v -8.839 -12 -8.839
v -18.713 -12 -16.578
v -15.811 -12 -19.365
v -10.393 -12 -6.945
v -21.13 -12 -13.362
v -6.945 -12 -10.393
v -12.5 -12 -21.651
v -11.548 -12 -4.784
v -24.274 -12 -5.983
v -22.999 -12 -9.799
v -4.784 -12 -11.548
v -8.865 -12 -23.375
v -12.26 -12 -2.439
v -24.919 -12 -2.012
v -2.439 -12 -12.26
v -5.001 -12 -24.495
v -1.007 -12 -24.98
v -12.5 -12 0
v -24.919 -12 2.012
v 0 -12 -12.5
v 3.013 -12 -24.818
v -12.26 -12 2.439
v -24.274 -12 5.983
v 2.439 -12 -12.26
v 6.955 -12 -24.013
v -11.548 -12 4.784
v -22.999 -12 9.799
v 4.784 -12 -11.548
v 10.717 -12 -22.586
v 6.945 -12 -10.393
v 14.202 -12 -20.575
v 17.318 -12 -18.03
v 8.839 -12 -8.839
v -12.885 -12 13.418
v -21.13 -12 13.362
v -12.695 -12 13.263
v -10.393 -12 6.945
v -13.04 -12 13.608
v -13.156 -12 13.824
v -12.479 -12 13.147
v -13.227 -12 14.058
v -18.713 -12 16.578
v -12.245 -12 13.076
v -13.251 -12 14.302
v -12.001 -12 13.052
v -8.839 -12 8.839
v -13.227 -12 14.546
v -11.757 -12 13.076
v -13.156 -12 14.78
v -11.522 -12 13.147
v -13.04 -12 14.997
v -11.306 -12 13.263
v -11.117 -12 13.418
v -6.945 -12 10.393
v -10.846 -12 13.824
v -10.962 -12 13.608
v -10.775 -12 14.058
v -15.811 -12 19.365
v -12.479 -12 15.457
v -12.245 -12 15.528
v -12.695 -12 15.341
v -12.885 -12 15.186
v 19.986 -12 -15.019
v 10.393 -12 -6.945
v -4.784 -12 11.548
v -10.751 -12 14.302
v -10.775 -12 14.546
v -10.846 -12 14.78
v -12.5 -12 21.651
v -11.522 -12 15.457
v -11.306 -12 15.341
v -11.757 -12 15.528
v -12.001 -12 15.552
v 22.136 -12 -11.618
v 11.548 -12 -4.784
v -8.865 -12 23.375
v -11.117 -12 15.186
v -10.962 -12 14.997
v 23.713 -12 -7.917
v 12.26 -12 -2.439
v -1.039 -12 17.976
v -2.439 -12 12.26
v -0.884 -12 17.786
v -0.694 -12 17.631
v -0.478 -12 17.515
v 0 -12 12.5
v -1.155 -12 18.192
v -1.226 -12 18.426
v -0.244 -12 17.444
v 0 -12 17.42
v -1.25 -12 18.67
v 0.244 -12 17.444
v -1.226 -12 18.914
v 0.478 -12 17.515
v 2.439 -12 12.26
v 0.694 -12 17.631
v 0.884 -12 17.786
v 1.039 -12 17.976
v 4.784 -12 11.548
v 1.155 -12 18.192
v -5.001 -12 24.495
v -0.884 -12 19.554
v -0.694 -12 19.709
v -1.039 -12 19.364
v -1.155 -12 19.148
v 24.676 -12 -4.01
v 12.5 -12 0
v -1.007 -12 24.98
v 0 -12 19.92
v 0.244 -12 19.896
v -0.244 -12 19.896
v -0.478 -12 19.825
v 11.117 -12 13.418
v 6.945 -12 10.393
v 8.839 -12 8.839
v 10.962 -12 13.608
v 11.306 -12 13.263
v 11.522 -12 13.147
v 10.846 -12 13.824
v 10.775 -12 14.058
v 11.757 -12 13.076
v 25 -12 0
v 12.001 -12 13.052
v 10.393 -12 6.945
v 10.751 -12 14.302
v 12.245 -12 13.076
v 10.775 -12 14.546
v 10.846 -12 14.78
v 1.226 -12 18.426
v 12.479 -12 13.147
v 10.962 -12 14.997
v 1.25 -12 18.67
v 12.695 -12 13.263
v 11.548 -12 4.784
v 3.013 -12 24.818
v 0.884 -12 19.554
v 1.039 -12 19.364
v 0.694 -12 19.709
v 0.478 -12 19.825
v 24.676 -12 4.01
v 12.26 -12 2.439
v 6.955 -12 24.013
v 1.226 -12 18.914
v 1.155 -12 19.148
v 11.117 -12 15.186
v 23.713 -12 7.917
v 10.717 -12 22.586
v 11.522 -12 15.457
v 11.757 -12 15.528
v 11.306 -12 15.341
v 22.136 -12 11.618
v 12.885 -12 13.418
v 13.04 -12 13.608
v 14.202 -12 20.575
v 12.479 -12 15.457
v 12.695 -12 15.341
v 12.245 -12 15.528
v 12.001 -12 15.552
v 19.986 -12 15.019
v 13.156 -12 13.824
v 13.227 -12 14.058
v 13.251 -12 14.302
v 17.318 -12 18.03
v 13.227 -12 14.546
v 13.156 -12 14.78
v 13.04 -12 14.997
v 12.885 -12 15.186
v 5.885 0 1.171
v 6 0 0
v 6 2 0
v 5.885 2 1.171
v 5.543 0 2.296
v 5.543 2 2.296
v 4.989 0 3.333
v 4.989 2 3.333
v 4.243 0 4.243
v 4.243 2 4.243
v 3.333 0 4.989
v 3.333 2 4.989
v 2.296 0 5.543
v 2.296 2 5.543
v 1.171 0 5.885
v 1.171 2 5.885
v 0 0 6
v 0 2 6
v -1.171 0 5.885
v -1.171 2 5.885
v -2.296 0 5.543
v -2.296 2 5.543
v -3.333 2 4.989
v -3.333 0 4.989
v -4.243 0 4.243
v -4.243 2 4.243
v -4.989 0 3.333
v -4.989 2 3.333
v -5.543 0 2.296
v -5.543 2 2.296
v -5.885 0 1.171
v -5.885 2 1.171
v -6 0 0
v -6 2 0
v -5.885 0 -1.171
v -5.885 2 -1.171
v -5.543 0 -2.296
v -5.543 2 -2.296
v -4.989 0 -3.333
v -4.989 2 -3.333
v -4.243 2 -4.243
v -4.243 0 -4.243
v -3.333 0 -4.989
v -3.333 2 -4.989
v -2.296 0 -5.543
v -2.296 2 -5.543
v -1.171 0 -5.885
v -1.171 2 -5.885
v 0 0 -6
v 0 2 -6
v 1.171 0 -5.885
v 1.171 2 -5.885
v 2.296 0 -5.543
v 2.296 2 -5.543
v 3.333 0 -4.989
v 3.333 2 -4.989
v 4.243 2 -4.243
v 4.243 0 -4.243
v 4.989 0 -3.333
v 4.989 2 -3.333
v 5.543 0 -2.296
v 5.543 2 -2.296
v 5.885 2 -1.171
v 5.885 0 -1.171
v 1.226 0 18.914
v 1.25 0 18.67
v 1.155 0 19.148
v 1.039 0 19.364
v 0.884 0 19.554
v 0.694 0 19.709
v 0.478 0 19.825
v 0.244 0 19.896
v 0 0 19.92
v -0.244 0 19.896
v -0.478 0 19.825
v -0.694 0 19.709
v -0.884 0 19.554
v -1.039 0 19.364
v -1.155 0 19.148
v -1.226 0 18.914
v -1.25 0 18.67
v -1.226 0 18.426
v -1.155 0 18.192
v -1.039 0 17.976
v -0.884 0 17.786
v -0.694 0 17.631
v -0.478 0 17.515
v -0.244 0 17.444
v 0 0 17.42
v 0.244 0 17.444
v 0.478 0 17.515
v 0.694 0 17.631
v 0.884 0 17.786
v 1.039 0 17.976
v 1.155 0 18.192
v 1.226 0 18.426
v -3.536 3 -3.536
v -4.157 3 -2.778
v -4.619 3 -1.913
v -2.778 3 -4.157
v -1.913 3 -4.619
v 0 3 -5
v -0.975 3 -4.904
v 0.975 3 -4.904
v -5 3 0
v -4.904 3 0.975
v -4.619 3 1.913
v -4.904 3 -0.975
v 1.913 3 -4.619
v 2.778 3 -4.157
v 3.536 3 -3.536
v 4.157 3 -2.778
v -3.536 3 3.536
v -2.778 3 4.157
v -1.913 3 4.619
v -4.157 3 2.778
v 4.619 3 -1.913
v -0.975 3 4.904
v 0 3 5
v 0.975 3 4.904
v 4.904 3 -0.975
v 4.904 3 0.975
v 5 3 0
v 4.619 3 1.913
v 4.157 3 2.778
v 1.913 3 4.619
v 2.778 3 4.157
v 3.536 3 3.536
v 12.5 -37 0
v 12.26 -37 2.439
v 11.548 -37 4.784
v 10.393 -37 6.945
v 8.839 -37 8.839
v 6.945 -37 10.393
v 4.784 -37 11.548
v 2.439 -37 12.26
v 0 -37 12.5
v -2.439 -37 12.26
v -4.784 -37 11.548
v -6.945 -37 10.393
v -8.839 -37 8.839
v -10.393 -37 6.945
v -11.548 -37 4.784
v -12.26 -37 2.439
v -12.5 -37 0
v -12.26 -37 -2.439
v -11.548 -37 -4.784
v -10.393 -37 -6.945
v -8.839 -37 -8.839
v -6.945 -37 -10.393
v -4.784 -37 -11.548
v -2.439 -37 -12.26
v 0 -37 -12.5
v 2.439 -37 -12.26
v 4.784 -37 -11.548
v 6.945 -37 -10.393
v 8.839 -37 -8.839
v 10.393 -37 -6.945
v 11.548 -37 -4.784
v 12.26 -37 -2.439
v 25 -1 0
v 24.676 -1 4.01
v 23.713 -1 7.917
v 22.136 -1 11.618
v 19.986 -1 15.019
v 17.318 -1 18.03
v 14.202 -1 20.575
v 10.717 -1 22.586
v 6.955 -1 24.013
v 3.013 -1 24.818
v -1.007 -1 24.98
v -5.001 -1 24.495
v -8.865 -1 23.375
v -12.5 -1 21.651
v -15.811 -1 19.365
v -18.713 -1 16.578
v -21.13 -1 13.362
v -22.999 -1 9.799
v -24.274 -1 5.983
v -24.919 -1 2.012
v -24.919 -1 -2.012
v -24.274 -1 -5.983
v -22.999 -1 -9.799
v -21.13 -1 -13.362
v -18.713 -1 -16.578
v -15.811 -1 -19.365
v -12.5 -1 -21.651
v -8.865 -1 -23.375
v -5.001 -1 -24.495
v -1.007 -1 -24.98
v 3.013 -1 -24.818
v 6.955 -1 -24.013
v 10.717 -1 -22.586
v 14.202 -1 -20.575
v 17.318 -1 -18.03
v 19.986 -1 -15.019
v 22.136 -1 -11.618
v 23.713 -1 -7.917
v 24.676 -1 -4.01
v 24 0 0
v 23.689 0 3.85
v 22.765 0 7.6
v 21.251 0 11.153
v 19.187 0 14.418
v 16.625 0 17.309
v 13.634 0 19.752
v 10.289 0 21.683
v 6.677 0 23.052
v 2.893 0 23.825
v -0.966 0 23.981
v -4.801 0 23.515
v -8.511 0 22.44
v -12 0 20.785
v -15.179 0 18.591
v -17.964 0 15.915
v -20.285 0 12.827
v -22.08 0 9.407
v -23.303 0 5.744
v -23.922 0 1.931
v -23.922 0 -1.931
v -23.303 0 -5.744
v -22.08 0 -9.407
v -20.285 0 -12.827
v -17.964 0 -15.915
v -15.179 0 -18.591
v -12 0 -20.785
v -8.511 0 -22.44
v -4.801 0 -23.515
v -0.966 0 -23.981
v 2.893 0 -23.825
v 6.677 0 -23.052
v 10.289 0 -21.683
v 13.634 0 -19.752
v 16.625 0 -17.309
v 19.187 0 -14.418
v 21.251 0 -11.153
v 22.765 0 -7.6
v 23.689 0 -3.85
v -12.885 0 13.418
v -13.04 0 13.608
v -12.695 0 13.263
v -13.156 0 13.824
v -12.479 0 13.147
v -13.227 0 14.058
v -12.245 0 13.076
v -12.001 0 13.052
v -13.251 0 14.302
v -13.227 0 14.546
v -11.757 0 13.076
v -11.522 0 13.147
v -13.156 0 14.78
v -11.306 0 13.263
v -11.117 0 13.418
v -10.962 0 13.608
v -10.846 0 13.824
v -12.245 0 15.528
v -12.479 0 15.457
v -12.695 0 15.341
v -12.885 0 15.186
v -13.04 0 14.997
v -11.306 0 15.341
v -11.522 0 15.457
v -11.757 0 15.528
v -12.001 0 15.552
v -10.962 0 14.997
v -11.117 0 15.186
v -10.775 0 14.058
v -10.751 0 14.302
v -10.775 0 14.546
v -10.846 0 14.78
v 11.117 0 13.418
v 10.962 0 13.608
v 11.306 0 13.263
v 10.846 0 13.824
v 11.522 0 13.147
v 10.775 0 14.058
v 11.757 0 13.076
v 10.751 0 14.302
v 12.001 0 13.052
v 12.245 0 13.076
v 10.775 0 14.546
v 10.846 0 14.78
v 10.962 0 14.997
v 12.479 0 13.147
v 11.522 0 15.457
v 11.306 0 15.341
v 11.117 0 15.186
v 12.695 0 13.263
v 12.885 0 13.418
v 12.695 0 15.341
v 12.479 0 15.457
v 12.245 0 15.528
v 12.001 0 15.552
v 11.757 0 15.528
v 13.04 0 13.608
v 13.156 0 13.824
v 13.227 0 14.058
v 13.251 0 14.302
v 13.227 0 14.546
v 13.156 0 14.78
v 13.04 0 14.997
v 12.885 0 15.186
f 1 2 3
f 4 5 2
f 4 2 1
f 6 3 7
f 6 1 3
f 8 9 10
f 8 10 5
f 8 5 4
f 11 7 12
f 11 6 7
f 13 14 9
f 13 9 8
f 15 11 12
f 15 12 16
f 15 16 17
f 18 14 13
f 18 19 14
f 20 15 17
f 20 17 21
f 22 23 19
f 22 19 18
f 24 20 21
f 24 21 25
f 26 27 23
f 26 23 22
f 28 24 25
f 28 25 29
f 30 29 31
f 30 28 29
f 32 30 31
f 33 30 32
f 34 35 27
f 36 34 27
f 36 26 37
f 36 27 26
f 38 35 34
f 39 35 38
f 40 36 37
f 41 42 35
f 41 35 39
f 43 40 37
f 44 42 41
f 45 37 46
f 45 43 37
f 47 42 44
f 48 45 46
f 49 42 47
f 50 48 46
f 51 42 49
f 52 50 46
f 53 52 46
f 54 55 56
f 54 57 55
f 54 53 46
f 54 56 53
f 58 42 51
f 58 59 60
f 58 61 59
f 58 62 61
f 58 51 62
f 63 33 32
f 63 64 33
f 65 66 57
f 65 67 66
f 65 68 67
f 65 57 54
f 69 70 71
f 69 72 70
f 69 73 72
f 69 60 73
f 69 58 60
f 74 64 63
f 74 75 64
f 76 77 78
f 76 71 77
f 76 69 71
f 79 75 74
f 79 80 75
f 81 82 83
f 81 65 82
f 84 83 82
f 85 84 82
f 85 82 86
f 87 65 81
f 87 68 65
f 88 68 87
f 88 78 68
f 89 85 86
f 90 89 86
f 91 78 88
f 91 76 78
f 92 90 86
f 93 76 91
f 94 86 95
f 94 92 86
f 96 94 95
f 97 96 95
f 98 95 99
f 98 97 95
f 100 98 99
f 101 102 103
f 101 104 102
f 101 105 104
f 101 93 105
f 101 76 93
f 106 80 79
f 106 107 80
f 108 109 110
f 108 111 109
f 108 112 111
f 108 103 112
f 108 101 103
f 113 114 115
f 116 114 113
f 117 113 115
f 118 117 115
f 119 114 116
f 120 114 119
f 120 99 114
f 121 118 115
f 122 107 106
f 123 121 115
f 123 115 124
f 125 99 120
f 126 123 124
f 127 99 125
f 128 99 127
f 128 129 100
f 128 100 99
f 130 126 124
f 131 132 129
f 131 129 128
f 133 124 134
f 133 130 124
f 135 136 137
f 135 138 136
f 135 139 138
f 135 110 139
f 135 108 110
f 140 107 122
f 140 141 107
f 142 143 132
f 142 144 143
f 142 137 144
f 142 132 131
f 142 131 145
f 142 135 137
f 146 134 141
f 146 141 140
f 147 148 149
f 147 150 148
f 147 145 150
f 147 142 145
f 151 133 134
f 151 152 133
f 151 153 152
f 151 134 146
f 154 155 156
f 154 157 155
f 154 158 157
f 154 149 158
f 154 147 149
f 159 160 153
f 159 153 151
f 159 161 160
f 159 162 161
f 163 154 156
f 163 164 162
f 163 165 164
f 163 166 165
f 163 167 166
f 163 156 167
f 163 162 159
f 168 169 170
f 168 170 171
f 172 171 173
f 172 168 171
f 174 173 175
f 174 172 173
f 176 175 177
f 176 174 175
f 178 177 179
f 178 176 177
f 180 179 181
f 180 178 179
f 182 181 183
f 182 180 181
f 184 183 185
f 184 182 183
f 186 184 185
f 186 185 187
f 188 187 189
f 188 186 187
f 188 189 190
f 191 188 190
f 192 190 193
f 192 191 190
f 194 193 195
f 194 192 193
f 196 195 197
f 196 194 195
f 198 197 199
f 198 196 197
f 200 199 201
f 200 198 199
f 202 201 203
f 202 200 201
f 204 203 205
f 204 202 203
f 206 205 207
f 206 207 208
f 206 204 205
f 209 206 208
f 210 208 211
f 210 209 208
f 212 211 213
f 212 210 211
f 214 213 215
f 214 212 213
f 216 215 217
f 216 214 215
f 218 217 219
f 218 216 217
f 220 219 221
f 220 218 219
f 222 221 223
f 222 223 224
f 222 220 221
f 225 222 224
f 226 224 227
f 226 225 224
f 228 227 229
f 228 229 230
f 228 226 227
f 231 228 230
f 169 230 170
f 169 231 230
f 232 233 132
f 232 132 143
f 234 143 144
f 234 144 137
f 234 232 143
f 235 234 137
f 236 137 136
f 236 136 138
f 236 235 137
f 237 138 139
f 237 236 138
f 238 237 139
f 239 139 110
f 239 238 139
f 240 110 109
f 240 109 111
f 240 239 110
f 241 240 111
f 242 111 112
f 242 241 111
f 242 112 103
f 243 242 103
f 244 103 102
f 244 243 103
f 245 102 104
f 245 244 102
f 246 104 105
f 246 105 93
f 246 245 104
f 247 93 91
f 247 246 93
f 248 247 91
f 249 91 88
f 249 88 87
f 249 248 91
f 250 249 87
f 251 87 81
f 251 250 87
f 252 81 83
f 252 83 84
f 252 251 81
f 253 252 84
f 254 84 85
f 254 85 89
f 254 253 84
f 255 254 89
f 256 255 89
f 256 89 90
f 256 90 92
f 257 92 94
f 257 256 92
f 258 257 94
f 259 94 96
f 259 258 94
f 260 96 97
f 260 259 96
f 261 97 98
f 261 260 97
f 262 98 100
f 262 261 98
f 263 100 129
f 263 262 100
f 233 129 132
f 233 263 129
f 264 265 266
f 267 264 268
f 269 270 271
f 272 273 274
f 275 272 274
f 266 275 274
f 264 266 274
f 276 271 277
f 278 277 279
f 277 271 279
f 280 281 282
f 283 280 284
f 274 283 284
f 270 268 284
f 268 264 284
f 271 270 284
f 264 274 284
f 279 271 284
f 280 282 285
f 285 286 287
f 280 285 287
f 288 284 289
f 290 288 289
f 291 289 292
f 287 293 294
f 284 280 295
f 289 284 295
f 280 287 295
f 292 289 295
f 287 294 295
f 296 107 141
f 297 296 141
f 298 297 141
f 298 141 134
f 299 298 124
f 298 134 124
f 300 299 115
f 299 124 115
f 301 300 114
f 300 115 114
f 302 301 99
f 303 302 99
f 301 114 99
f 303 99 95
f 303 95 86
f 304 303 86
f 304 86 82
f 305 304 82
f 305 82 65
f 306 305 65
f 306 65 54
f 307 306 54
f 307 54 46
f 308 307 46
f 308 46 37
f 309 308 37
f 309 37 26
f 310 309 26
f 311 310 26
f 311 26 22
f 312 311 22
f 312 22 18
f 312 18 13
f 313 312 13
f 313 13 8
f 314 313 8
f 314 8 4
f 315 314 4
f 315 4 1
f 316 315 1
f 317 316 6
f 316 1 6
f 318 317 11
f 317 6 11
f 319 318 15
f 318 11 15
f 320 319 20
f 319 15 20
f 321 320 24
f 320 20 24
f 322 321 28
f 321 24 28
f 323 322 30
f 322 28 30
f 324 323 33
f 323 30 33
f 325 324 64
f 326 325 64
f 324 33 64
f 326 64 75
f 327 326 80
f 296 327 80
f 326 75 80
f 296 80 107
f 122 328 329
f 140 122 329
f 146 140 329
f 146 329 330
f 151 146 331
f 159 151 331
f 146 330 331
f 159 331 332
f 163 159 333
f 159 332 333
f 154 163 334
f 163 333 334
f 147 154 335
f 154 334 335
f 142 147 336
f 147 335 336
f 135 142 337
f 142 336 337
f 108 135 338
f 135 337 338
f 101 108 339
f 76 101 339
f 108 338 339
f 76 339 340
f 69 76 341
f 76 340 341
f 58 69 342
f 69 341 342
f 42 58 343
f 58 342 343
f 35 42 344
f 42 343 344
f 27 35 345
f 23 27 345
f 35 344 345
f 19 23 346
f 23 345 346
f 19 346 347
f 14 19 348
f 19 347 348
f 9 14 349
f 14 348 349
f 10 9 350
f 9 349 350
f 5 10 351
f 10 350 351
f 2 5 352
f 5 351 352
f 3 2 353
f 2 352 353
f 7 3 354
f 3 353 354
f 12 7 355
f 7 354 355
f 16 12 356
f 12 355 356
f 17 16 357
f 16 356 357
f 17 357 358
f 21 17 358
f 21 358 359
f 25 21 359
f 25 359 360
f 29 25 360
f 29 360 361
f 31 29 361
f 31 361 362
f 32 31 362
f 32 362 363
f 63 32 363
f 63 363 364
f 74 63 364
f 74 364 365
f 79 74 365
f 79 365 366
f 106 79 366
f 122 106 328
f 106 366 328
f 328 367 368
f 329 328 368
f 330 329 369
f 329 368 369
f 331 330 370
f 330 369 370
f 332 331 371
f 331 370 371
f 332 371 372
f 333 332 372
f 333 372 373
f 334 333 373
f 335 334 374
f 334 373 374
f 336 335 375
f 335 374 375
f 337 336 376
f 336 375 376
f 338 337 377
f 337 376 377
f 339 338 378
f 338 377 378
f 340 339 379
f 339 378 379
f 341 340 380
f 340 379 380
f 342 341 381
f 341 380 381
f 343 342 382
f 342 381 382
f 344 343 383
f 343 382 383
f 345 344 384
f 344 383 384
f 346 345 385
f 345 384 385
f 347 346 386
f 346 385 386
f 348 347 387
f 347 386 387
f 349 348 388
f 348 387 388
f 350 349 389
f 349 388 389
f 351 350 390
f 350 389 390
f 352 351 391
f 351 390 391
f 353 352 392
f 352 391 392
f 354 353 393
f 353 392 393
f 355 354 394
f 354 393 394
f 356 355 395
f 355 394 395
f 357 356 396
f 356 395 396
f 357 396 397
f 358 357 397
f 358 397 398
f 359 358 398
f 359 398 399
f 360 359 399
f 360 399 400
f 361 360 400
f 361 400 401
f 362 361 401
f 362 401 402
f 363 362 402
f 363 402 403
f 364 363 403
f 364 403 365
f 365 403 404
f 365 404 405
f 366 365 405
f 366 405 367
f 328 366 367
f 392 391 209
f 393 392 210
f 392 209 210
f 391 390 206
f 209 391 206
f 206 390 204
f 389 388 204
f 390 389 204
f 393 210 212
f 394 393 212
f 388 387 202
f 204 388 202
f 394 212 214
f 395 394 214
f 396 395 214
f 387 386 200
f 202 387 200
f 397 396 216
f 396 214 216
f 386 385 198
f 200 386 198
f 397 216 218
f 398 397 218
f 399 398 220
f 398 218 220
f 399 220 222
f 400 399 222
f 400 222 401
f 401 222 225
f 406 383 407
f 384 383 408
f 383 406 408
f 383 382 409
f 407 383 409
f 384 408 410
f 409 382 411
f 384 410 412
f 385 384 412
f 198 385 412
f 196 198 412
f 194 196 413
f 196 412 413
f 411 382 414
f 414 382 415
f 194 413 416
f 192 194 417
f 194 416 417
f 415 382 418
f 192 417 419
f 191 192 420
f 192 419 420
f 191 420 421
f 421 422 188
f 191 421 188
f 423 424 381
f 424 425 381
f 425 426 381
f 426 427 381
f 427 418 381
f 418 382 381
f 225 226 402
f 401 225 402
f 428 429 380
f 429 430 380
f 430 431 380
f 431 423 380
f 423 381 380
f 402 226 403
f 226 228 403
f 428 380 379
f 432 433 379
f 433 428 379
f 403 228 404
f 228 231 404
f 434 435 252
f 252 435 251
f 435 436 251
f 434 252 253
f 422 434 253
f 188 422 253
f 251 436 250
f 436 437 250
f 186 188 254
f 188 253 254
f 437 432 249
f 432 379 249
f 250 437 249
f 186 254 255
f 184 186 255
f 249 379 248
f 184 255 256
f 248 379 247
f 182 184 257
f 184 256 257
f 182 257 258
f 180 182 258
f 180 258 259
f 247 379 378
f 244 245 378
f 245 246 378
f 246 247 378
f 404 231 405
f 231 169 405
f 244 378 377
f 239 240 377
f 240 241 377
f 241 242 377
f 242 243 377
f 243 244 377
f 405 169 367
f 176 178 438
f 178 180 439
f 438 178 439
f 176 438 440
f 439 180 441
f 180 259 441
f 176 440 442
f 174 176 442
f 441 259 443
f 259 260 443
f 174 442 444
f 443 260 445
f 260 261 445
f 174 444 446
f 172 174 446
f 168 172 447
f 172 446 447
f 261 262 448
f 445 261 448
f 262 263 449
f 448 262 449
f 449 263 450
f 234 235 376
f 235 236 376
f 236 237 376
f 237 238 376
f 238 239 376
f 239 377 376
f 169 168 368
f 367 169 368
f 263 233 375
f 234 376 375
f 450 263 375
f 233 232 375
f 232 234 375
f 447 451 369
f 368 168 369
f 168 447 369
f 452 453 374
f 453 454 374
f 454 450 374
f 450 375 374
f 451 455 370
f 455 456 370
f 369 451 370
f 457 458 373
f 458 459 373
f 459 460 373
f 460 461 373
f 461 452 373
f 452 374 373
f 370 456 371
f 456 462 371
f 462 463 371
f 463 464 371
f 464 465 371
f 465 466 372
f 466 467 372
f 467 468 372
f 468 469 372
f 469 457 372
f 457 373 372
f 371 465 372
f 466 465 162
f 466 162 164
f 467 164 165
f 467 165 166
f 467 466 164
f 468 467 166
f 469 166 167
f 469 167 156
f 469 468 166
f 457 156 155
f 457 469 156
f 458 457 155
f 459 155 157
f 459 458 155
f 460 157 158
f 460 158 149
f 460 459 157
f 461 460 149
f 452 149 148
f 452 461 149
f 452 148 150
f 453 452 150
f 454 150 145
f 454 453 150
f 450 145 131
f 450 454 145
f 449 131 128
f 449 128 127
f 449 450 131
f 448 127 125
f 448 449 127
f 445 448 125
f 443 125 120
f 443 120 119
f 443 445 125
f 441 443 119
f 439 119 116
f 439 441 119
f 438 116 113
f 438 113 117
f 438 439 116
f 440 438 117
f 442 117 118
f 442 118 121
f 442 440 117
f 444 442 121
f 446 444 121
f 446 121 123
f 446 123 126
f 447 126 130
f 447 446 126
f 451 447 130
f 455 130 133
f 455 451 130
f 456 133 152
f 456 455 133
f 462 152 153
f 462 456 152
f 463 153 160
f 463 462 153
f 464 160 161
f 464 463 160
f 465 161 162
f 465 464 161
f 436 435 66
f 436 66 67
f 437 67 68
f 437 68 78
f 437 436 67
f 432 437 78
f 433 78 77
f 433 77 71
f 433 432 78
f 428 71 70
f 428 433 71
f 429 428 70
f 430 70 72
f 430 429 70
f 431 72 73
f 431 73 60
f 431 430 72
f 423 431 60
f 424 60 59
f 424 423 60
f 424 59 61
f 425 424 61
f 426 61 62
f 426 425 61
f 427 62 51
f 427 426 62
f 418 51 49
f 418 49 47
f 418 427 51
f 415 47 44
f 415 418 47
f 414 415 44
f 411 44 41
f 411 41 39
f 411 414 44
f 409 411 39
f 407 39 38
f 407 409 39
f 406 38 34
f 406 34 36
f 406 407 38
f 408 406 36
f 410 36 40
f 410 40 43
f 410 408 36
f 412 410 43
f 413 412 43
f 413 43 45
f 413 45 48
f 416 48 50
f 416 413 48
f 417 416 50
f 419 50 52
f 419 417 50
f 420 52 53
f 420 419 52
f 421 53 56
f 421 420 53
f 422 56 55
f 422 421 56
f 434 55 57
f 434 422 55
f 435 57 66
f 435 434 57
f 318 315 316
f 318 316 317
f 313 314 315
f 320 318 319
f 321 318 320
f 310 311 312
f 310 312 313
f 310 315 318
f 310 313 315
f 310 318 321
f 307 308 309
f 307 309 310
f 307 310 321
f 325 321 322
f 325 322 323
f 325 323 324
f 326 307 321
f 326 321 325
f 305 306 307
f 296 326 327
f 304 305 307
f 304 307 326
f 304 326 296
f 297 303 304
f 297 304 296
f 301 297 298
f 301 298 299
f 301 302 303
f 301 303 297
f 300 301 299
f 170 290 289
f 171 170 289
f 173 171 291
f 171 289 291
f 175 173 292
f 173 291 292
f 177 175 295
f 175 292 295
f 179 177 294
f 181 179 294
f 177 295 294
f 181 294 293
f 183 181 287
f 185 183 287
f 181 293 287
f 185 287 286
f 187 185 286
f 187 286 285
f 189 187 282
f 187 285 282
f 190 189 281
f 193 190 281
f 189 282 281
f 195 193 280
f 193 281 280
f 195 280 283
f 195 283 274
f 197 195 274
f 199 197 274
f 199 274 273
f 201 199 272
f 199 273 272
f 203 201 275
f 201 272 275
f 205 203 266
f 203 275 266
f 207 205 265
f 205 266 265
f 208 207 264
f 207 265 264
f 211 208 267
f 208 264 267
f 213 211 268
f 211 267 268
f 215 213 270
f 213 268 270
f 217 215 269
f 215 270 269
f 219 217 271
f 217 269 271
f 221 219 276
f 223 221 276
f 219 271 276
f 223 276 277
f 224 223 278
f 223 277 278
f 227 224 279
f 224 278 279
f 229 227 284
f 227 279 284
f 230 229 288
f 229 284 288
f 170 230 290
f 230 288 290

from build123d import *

# Parameters (mm, degrees)
F0_R     = 6
F1_DEPTH = 3
F0_R_2   = 12.5
F2_DEPTH = 37
F0_R_3   = 25
F0_R_4   = 1.25
F3_DEPTH = 12
F4_DEPTH = 37
F5_SIZE  = 1


with BuildPart() as f1:
    # F0 (on Front) → F1 (new body)
    with BuildSketch(Plane.XZ):
        Circle(F0_R)
    extrude(amount=-F1_DEPTH)



with BuildPart() as f2:
    # F0 (on Front) → F2 (new body)
    with BuildSketch(Plane.XZ):
        Circle(F0_R_2)
        Circle(F0_R, mode=Mode.SUBTRACT)
    extrude(amount=F2_DEPTH)

    # F0 (on Front) → F3 (join)
    with BuildSketch(Plane.XZ):
        Circle(F0_R_3)
        with Locations((-12.000845, 14.30205)):
            Circle(F0_R_4, mode=Mode.SUBTRACT)
        Circle(F0_R_2, mode=Mode.SUBTRACT)
        with Locations((0, 18.67)):
            Circle(F0_R_4, mode=Mode.SUBTRACT)
        with Locations((12.000845, 14.30205)):
            Circle(F0_R_4, mode=Mode.SUBTRACT)
    extrude(amount=F3_DEPTH)


with BuildPart() as f1_1:
    add(f1.part)

    add(f2.part)  # F4 merges F2
    # F0 (on Front) → F4 (join)
    with BuildSketch(Plane.XZ):
        Circle(F0_R)
    extrude(amount=F4_DEPTH)

    # F5
    f5_edges = [f1_1.edges().sort_by_distance(p)[0] for p in [
        (-25, 0, 0),
        (-6, 3, 0),
    ]]
    chamfer(f5_edges, length=F5_SIZE)


solid = f1_1.part
